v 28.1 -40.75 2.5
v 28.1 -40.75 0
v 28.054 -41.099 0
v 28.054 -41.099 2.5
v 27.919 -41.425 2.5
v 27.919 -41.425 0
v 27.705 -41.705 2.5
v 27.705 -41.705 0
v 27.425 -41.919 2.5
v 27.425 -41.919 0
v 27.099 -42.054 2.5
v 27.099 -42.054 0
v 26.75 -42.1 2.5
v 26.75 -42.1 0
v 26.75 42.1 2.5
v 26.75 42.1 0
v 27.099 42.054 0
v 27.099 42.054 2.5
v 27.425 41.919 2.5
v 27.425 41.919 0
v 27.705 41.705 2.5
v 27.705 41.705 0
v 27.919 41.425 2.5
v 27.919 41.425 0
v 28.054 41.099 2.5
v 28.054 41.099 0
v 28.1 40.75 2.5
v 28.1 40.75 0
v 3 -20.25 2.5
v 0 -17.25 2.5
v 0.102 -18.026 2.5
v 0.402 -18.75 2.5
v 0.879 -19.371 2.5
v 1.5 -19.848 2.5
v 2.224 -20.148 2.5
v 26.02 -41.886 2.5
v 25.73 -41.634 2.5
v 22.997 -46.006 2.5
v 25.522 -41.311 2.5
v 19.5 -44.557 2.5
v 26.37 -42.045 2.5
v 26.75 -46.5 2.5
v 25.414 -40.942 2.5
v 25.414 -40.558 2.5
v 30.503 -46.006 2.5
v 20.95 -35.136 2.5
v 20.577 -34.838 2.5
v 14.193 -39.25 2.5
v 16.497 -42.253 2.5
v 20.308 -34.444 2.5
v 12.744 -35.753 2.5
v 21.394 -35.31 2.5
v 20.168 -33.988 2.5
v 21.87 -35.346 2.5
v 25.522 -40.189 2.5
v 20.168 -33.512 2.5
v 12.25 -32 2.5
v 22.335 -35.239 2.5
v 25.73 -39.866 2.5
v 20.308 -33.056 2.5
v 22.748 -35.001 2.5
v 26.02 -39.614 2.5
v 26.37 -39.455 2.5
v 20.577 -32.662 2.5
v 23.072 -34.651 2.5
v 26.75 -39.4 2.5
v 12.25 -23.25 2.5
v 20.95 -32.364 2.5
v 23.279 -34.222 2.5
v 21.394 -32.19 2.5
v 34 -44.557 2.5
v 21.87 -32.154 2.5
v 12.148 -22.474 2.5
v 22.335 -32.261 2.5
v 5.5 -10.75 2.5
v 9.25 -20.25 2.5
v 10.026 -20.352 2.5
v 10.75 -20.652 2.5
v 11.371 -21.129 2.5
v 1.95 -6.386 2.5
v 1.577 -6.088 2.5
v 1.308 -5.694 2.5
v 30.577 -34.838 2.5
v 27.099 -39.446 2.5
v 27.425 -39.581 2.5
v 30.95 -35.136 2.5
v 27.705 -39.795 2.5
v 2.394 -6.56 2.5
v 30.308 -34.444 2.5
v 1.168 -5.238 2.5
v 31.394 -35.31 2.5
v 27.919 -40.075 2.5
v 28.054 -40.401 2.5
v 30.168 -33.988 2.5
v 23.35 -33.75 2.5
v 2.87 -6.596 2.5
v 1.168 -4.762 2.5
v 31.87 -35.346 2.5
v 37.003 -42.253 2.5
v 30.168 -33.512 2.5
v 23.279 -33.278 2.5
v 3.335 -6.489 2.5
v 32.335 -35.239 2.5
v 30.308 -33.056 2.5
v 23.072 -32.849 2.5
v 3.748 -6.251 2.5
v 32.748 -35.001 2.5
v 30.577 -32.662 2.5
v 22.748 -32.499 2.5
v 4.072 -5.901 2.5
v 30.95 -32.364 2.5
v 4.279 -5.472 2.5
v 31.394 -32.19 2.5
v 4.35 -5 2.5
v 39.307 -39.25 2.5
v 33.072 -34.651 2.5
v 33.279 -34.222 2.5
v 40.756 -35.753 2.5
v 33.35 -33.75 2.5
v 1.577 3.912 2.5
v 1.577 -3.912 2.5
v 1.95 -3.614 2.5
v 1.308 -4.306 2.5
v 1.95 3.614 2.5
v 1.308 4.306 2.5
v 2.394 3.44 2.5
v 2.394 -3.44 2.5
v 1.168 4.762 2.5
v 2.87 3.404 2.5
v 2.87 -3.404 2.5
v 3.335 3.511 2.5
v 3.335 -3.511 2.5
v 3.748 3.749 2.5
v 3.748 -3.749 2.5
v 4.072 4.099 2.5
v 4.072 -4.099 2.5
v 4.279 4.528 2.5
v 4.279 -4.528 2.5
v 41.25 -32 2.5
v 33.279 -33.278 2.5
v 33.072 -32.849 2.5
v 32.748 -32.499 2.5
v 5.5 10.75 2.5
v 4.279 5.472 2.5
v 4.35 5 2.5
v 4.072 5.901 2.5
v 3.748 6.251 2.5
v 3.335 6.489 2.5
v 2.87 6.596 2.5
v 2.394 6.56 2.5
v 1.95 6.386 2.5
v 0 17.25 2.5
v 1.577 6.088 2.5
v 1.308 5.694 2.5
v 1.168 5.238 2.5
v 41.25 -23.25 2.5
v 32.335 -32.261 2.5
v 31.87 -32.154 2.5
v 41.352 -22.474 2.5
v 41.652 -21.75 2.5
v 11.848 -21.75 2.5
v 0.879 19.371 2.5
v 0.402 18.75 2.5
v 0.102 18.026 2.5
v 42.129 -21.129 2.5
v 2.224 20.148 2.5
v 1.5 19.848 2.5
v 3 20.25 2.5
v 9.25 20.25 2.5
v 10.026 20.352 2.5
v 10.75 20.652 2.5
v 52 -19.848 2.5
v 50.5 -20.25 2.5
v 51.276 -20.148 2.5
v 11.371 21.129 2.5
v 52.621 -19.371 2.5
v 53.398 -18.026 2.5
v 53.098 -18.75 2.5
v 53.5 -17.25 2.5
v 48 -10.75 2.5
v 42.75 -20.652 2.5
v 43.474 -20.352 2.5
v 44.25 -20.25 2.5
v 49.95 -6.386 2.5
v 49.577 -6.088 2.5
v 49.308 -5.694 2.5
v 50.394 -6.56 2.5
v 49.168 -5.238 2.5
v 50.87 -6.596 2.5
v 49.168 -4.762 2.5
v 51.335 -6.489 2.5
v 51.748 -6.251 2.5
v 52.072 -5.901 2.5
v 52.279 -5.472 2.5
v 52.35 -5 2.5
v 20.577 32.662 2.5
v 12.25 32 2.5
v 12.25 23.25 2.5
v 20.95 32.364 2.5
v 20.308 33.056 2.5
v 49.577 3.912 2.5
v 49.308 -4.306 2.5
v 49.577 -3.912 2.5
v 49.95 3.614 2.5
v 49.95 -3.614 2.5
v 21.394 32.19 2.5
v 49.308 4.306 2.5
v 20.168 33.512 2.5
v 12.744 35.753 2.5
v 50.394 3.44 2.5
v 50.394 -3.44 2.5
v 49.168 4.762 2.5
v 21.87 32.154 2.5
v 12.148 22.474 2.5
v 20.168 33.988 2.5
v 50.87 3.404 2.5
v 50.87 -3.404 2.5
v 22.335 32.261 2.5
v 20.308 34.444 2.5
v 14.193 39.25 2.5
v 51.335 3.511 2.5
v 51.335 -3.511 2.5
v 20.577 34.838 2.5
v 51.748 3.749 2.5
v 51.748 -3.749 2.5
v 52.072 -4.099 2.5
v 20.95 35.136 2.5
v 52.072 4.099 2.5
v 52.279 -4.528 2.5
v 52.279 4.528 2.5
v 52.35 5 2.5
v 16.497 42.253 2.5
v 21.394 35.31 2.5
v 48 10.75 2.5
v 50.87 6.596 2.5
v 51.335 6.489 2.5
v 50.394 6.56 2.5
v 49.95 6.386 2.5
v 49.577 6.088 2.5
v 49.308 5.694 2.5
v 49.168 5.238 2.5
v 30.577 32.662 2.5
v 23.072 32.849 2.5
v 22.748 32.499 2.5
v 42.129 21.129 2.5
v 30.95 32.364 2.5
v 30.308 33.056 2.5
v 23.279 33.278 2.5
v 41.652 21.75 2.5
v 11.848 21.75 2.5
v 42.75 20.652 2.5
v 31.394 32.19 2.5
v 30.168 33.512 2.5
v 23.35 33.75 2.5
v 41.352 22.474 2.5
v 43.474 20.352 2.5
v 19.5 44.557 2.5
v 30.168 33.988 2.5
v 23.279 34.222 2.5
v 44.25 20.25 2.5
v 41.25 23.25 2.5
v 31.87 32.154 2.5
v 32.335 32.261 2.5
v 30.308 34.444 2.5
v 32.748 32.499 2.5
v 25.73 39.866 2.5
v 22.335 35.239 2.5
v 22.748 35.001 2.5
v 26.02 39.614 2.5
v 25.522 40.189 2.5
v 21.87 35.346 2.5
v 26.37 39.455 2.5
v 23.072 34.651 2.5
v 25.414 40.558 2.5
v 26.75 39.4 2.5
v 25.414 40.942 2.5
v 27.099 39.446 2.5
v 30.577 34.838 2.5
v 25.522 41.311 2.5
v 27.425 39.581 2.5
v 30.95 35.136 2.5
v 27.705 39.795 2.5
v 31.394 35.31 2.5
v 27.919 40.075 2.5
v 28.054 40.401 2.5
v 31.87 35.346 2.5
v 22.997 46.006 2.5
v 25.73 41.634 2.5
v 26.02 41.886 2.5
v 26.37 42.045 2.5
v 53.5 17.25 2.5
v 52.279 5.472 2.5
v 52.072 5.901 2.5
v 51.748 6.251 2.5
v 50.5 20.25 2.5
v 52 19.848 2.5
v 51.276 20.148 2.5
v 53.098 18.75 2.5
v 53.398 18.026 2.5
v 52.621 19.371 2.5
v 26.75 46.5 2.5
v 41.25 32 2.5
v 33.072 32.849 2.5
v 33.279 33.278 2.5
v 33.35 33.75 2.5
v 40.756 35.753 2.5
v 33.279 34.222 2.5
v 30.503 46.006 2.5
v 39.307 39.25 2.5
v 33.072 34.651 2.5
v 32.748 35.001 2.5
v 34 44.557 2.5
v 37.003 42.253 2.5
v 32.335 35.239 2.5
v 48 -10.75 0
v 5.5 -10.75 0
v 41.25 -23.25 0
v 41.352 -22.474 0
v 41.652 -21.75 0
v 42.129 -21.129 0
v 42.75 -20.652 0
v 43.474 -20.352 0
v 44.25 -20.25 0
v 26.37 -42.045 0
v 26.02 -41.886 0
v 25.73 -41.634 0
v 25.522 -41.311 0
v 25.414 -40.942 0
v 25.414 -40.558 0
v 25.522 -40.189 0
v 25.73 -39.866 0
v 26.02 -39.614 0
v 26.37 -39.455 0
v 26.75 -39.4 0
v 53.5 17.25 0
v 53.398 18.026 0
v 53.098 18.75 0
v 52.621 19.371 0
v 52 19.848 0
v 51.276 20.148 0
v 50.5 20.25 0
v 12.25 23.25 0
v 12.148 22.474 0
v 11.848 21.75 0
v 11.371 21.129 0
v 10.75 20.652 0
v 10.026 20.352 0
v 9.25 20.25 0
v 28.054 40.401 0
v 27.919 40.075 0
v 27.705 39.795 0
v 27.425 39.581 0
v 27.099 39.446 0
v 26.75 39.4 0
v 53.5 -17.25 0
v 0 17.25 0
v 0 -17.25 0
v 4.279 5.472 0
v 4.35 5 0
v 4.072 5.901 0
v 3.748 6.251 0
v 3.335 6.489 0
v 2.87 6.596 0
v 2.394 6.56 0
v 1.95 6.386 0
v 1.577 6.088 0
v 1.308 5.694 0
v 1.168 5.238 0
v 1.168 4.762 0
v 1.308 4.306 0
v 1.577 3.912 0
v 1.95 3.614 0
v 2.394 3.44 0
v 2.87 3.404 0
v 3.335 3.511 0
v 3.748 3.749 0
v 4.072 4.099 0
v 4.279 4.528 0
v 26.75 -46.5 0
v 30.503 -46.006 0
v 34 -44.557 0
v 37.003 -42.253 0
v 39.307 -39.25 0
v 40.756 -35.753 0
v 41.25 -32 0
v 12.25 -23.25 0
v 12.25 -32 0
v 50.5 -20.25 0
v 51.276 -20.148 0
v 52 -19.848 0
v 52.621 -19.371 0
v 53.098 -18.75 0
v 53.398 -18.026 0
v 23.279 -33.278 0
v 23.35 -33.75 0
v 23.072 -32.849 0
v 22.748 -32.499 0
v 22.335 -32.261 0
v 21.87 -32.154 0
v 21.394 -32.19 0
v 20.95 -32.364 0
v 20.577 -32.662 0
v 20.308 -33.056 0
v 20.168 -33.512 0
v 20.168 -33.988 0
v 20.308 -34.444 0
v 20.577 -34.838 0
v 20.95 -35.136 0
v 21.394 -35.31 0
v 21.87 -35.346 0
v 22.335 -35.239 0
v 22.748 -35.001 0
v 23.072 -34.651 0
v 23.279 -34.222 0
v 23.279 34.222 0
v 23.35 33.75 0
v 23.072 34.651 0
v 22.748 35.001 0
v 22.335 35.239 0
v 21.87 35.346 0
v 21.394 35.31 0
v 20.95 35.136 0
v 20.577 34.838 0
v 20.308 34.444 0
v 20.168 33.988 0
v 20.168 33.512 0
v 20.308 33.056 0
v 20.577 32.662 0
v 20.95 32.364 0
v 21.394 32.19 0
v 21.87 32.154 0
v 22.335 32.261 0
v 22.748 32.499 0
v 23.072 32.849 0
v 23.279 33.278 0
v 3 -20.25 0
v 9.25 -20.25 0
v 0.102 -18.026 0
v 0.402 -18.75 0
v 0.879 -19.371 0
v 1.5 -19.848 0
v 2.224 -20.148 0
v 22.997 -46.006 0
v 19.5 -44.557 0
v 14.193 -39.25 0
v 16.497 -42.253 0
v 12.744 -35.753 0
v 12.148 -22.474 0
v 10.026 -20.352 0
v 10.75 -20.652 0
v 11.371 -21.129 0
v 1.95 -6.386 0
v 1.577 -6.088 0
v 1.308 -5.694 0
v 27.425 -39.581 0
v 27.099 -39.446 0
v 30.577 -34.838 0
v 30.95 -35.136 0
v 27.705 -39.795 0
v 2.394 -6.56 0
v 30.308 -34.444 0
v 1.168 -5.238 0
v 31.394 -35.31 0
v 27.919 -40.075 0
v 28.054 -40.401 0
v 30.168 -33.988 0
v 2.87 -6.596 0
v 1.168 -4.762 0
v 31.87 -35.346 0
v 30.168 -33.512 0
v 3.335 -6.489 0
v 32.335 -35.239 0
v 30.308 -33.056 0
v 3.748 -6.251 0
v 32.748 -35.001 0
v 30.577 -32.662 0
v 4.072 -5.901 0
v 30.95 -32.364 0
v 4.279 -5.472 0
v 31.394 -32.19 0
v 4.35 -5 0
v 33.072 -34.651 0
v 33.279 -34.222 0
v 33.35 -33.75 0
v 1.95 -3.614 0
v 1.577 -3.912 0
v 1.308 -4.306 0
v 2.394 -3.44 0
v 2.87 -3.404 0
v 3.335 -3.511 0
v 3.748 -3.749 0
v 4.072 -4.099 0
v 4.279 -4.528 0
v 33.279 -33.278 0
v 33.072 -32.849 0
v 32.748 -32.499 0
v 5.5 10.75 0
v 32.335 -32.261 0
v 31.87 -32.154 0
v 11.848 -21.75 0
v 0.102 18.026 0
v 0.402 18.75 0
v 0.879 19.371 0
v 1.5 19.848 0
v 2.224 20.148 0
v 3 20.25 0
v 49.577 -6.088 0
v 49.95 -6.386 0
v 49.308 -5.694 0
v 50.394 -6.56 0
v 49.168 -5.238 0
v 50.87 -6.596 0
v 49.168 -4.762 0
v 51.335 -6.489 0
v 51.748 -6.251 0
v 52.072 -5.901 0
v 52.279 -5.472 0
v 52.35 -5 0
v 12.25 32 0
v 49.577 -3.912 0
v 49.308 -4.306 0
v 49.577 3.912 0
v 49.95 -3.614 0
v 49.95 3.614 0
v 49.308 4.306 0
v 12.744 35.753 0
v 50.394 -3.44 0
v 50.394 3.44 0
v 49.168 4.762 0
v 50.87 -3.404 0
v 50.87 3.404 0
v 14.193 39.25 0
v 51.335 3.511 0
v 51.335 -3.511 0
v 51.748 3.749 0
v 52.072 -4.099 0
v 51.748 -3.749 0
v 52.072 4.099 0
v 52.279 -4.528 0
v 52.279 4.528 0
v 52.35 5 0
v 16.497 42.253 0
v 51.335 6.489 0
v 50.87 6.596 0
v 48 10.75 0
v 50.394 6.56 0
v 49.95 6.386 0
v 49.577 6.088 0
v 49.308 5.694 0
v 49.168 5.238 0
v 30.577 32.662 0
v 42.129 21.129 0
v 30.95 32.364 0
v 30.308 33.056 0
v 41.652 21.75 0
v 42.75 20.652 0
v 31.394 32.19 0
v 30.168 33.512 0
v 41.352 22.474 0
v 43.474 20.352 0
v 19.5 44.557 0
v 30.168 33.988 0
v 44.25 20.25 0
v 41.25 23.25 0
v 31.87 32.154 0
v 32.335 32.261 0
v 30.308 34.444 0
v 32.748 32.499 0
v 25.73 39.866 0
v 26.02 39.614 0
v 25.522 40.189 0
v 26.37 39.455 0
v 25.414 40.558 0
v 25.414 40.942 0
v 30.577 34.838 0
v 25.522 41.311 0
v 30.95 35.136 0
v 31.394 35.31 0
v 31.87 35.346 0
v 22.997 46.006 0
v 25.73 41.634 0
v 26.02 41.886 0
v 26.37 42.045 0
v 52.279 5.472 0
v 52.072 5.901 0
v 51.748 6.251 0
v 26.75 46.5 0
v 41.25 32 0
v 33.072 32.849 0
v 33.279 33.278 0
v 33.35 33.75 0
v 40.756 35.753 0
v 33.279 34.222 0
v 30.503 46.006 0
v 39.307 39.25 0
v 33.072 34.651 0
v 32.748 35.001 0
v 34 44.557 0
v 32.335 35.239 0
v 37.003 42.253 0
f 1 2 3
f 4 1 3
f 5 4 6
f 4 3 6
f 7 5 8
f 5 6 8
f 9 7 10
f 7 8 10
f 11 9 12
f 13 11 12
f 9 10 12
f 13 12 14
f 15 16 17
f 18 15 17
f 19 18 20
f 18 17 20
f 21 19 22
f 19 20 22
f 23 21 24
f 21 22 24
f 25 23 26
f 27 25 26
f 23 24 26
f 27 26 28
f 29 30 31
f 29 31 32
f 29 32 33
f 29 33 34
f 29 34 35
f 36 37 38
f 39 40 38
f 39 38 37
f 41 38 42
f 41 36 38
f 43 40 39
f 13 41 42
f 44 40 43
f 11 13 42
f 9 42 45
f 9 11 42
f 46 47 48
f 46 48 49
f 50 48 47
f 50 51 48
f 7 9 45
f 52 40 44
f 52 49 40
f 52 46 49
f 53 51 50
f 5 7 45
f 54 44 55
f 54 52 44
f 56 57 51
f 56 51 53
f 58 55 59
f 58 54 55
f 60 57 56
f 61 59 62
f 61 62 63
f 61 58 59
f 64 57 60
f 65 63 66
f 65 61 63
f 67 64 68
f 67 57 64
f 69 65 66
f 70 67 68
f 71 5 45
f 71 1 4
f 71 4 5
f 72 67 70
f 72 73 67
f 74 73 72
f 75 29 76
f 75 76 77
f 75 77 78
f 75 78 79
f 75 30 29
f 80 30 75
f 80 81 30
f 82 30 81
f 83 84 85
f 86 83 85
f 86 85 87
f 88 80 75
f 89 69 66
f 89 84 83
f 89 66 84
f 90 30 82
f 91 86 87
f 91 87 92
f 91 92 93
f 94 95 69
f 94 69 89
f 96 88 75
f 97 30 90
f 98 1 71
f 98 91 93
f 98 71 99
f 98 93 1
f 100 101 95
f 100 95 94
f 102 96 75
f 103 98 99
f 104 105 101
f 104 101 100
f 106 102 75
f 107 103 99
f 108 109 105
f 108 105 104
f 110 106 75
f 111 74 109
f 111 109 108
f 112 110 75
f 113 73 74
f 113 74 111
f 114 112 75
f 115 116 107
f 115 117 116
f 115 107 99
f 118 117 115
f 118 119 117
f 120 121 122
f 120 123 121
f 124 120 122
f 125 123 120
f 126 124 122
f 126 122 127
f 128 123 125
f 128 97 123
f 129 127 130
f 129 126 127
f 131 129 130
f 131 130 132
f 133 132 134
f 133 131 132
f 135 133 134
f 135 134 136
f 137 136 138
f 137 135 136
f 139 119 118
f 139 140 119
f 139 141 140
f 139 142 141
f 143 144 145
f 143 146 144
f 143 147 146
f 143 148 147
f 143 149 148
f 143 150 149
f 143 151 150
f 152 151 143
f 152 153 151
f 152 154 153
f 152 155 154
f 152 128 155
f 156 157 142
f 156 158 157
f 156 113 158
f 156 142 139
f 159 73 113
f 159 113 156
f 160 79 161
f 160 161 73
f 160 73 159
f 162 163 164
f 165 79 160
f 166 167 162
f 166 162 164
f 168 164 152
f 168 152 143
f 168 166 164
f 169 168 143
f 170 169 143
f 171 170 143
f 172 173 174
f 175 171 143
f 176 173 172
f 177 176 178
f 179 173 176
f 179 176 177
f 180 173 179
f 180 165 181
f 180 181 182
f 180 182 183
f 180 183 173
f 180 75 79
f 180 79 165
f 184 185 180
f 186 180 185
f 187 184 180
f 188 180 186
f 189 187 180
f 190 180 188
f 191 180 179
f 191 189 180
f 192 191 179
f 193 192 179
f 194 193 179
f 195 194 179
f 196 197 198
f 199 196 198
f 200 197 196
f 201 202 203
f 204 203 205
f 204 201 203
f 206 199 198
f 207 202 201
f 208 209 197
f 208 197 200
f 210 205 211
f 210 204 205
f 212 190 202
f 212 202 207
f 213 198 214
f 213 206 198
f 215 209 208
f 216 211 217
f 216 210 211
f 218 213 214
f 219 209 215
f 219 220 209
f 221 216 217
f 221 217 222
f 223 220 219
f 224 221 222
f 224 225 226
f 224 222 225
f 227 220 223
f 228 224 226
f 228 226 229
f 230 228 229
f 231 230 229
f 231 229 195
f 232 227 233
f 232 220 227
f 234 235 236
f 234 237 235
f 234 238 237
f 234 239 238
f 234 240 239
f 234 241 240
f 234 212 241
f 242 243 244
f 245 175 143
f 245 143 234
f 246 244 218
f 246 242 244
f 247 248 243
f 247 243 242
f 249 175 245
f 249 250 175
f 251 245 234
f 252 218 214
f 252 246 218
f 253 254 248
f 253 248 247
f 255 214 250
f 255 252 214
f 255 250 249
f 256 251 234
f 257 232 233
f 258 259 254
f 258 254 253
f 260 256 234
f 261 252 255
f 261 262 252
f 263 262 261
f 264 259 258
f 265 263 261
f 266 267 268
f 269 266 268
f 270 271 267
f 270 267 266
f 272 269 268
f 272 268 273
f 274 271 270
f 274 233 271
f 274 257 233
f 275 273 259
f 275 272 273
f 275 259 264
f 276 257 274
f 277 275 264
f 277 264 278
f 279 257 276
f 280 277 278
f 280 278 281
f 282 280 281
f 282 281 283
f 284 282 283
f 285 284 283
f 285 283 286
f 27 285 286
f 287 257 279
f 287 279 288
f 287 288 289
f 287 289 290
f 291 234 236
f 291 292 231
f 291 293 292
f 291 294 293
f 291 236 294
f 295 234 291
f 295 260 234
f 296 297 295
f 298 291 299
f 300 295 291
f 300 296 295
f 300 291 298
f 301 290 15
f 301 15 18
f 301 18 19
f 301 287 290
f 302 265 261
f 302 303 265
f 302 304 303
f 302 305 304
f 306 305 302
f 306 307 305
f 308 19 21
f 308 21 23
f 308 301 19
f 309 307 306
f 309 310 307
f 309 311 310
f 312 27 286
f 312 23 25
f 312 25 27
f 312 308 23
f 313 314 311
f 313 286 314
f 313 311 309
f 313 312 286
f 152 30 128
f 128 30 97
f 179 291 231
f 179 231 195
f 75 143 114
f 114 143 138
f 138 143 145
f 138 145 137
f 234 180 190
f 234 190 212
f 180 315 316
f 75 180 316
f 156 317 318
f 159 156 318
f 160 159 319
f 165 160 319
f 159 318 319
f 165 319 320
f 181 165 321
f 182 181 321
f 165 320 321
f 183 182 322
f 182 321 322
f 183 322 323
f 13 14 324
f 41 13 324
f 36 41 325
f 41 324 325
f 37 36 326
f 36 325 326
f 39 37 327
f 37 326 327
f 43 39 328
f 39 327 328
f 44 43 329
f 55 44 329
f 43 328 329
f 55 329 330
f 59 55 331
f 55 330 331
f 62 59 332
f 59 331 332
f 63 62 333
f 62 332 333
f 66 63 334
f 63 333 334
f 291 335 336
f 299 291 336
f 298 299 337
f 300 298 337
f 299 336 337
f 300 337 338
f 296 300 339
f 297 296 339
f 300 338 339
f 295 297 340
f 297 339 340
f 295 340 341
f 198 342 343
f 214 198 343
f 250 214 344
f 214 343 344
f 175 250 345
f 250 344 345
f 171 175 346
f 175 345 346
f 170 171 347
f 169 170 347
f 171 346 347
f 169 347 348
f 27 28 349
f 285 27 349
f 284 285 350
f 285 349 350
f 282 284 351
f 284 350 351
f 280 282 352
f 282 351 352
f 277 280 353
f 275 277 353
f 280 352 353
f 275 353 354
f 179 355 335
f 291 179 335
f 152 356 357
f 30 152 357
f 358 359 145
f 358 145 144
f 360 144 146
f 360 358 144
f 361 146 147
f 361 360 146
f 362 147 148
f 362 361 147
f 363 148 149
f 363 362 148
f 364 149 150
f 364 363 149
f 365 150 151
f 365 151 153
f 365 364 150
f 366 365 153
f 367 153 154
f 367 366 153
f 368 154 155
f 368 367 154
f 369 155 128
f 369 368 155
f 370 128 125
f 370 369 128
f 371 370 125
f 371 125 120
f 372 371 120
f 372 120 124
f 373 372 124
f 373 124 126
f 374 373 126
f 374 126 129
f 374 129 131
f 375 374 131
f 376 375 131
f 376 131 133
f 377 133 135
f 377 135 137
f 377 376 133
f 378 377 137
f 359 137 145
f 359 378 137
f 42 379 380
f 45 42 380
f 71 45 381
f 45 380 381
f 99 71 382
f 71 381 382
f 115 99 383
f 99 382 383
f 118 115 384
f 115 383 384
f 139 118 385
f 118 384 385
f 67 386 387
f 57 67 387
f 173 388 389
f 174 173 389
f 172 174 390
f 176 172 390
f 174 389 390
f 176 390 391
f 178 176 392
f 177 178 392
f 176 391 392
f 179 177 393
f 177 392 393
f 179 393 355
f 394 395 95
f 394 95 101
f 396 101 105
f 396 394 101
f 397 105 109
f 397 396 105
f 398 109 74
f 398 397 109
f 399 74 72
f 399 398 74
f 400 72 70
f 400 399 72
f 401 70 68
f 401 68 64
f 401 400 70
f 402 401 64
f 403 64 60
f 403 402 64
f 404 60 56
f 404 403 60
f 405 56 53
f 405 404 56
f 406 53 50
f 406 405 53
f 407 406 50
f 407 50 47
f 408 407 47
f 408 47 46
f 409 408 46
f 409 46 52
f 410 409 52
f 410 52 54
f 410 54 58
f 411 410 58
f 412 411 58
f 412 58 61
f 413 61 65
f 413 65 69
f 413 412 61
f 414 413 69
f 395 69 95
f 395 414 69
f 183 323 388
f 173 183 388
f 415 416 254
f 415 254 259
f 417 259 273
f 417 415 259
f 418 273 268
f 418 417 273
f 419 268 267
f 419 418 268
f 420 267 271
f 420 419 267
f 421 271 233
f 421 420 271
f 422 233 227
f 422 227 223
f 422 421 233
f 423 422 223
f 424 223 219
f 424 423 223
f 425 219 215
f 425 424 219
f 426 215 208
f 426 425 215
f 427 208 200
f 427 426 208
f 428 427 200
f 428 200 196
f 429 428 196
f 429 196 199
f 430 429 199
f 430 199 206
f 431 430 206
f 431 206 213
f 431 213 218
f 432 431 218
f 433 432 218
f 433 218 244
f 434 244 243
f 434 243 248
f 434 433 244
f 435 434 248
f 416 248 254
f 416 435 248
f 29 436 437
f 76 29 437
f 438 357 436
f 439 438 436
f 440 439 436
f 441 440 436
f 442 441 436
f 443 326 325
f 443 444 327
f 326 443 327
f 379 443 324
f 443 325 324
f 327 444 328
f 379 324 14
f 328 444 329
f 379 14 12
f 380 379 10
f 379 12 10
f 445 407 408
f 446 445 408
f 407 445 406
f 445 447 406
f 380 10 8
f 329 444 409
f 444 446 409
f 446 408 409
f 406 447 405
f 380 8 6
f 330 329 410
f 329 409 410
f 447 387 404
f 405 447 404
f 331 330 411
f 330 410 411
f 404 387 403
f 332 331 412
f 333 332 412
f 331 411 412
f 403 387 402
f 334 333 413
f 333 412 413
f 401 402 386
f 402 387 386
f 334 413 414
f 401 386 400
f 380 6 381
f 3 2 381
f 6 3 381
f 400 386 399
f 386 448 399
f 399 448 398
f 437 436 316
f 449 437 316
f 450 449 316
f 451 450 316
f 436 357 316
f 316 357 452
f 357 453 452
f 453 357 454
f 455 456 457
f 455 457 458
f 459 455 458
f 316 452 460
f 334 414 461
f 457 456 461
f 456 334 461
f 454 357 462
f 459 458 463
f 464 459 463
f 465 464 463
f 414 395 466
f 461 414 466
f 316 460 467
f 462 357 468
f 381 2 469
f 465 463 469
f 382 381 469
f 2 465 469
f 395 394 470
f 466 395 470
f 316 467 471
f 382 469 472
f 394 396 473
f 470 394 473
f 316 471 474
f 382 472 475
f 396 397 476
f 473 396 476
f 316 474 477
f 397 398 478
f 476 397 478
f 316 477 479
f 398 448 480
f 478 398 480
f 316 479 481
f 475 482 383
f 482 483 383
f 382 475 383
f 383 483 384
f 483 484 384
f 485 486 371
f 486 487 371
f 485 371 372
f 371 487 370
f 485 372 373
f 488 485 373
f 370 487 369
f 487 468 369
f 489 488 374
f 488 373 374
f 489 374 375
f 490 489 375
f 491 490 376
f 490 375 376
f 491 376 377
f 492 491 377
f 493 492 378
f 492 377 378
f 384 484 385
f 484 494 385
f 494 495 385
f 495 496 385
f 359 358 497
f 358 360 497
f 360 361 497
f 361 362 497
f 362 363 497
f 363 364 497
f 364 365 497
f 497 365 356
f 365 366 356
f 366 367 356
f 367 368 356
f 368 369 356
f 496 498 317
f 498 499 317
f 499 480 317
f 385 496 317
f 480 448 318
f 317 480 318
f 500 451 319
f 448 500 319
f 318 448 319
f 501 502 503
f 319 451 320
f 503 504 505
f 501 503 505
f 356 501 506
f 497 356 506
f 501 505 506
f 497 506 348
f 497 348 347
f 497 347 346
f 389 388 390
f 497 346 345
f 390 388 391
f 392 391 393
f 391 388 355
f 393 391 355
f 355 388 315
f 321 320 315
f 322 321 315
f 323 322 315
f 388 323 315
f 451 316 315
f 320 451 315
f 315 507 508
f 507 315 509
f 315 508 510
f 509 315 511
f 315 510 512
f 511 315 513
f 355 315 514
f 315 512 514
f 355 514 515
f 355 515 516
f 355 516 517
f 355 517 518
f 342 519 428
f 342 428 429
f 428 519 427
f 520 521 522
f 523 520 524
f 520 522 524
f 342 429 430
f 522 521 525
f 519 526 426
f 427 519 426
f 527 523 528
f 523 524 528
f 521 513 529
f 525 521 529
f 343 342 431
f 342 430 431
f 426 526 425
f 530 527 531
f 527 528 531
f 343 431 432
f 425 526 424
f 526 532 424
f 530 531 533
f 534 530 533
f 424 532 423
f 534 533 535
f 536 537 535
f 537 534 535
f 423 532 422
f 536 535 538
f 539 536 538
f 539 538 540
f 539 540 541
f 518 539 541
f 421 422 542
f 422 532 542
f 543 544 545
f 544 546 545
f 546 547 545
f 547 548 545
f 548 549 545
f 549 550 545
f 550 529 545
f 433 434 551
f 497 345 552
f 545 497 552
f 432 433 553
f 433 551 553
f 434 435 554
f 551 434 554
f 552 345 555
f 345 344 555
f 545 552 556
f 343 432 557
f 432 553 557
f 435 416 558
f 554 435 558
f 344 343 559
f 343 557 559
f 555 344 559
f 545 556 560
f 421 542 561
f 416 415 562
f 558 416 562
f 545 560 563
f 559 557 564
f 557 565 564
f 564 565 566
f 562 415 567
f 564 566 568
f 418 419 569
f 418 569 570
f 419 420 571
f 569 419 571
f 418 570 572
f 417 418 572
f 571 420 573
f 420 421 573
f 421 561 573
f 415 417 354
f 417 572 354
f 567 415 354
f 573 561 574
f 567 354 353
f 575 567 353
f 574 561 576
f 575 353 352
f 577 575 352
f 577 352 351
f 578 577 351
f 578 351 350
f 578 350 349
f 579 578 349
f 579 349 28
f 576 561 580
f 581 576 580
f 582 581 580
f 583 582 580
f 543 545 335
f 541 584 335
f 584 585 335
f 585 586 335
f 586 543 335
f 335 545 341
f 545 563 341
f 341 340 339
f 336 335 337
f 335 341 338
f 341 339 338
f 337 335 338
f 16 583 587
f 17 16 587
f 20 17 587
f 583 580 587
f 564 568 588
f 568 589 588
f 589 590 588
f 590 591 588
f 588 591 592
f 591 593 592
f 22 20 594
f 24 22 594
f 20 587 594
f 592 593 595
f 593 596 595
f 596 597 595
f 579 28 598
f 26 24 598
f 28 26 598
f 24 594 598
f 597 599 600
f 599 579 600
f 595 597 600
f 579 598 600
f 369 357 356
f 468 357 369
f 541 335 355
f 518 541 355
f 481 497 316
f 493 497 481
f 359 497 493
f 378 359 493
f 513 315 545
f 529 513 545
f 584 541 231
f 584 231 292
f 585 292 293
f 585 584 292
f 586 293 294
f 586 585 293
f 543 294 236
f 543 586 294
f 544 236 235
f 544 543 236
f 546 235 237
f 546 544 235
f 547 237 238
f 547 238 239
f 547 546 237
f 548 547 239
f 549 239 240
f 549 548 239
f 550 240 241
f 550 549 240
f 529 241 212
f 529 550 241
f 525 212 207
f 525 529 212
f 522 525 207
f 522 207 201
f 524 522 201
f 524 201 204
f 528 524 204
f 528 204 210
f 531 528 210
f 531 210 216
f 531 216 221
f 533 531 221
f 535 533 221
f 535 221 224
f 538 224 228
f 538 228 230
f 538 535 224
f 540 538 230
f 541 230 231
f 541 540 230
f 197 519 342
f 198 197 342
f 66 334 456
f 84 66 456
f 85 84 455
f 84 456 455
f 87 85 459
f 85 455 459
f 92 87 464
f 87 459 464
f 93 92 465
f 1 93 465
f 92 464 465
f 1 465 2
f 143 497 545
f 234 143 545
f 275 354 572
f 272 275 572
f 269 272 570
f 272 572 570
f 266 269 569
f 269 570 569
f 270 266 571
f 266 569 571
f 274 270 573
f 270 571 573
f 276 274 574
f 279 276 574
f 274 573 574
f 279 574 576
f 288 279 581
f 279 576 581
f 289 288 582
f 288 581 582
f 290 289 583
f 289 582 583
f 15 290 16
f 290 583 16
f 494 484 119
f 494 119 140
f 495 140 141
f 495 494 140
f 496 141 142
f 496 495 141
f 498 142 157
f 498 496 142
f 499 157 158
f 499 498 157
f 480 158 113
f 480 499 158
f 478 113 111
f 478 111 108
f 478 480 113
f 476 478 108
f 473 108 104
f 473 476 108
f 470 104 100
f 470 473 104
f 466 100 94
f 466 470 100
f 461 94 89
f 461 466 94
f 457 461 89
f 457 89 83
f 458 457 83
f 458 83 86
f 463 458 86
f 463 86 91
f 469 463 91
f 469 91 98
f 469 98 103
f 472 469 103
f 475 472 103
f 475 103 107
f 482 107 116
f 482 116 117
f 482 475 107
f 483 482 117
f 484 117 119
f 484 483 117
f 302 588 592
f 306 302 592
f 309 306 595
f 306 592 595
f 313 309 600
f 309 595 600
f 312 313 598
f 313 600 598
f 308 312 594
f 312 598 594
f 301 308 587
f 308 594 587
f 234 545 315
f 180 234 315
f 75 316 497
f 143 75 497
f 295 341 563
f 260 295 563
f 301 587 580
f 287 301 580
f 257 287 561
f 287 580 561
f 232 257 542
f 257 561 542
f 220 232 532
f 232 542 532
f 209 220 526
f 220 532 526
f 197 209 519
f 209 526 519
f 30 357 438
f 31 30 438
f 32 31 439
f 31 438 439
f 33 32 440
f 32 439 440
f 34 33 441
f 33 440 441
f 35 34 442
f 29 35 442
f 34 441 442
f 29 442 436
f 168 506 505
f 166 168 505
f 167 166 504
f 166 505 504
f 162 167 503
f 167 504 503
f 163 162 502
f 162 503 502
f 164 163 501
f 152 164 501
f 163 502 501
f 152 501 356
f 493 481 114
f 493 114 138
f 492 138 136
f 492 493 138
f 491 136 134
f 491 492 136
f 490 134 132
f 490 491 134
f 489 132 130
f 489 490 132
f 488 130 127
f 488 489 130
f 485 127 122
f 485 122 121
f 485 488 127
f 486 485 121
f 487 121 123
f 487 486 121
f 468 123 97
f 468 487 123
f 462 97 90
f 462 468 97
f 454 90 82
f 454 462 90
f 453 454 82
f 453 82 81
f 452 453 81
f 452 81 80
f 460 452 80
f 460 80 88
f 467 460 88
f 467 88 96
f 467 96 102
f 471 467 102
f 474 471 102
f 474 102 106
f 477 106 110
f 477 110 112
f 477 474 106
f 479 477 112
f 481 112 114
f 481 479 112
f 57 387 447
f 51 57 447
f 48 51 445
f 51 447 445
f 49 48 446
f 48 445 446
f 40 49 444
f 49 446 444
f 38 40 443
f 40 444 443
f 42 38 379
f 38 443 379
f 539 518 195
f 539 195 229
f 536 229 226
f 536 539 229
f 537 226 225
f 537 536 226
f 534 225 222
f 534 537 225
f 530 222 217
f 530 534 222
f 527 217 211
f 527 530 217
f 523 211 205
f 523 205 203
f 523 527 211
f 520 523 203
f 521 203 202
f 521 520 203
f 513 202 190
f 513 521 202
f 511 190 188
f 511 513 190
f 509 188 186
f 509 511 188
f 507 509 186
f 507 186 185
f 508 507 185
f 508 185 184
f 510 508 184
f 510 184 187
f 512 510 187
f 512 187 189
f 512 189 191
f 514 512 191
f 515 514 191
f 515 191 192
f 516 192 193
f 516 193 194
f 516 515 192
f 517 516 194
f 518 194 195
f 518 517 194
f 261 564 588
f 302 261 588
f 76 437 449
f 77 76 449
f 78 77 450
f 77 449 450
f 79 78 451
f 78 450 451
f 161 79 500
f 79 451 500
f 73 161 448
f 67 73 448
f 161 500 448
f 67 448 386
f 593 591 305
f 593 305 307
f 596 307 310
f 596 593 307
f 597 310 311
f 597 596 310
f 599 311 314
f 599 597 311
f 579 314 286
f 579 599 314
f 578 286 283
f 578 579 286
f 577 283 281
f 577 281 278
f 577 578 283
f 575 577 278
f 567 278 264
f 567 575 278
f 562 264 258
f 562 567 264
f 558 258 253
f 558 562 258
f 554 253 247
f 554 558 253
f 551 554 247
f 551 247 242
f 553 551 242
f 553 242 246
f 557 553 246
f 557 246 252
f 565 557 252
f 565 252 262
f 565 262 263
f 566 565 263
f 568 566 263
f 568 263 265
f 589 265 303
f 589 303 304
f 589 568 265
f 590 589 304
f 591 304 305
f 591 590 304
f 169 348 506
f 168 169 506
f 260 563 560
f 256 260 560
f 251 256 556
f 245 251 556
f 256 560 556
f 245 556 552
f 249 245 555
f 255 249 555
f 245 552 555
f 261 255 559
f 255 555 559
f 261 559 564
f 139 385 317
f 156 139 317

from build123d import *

# Parameters (mm, degrees)
F0_R     = 1.6
F1_DEPTH = 2.5


with BuildPart() as f1:
    # F0 (on Top) → F1 (new body)
    with BuildSketch(Plane.XY):
        with BuildLine():
            Line((0, 17.25), (0, 0))
            Line((0, 0), (5.5, 0))
            Line((5.5, 0), (5.5, 10.75))
            Line((5.5, 10.75), (26.75, 10.75))
            Line((26.75, 10.75), (26.75, 32))
            Line((26.75, 32), (12.25, 32))
            Line((12.25, 32), (12.25, 23.25))
            ThreePointArc((12.25, 23.25), (11.37132, 21.12868), (9.25, 20.25))
            Line((9.25, 20.25), (3, 20.25))
            ThreePointArc((3, 20.25), (0.87868, 19.37132), (0, 17.25))
        make_face()
        with Locations((2.75, 5)):
            Circle(F0_R, mode=Mode.SUBTRACT)
        with BuildLine():
            Line((5.5, 0), (0, 0))
            Line((0, 0), (0, -17.25))
            ThreePointArc((0, -17.25), (0.87868, -19.37132), (3, -20.25))
            Line((3, -20.25), (9.25, -20.25))
            ThreePointArc((9.25, -20.25), (11.37132, -21.12868), (12.25, -23.25))
            Line((12.25, -23.25), (12.25, -32))
            Line((12.25, -32), (26.75, -32))
            Line((26.75, -32), (26.75, -10.75))
            Line((26.75, -10.75), (5.5, -10.75))
            Line((5.5, -10.75), (5.5, 0))
        make_face()
        with Locations((2.75, -5)):
            Circle(F0_R, mode=Mode.SUBTRACT)
        with BuildLine():
            Line((48, 10.75), (48, 0))
            Line((48, 0), (53.5, 0))
            Line((53.5, 0), (53.5, 17.25))
            ThreePointArc((53.5, 17.25), (52.62132, 19.37132), (50.5, 20.25))
            Line((50.5, 20.25), (44.25, 20.25))
            ThreePointArc((44.25, 20.25), (42.12868, 21.12868), (41.25, 23.25))
            Line((41.25, 23.25), (41.25, 32))
            Line((41.25, 32), (26.75, 32))
            Line((26.75, 32), (26.75, 10.75))
            Line((26.75, 10.75), (48, 10.75))
        make_face()
        with Locations((50.75, 5)):
            Circle(F0_R, mode=Mode.SUBTRACT)
        with BuildLine():
            Line((53.5, 0), (48, 0))
            Line((48, 0), (48, -10.75))
            Line((48, -10.75), (26.75, -10.75))
            Line((26.75, -10.75), (26.75, -32))
            Line((26.75, -32), (41.25, -32))
            Line((41.25, -32), (41.25, -23.25))
            ThreePointArc((41.25, -23.25), (42.12868, -21.12868), (44.25, -20.25))
            Line((44.25, -20.25), (50.5, -20.25))
            ThreePointArc((50.5, -20.25), (52.62132, -19.37132), (53.5, -17.25))
            Line((53.5, -17.25), (53.5, 0))
        make_face()
        with Locations((50.75, -5)):
            Circle(F0_R, mode=Mode.SUBTRACT)
        with BuildLine():
            Line((41.25, -32), (26.75, -32))
            Line((26.75, -32), (26.75, -39.4))
            ThreePointArc((26.75, -39.4), (27.704594, -39.795406), (28.1, -40.75))
            ThreePointArc((28.1, -40.75), (27.704594, -41.704594), (26.75, -42.1))
            Line((26.75, -42.1), (26.75, -46.5))
            ThreePointArc((26.75, -46.5), (37.003048, -42.253048), (41.25, -32))
        make_face()
        with Locations((31.75, -33.75)):
            Circle(F0_R, mode=Mode.SUBTRACT)
        with BuildLine():
            Line((26.75, -39.4), (26.75, -32))
            Line((26.75, -32), (12.25, -32))
            ThreePointArc((12.25, -32), (16.496952, -42.253048), (26.75, -46.5))
            Line((26.75, -46.5), (26.75, -42.1))
            ThreePointArc((26.75, -42.1), (25.4, -40.75), (26.75, -39.4))
        make_face()
        with Locations((21.75, -33.75)):
            Circle(F0_R, mode=Mode.SUBTRACT)
        with BuildLine():
            Line((12.25, 32), (26.75, 32))
            Line((26.75, 32), (26.75, 39.4))
            ThreePointArc((26.75, 39.4), (25.4, 40.75), (26.75, 42.1))
            Line((26.75, 42.1), (26.75, 46.5))
            ThreePointArc((26.75, 46.5), (16.496952, 42.253048), (12.25, 32))
        make_face()
        with Locations((21.75, 33.75)):
            Circle(F0_R, mode=Mode.SUBTRACT)
        with BuildLine():
            Line((26.75, 39.4), (26.75, 32))
            Line((26.75, 32), (41.25, 32))
            ThreePointArc((41.25, 32), (37.003048, 42.253048), (26.75, 46.5))
            Line((26.75, 46.5), (26.75, 42.1))
            ThreePointArc((26.75, 42.1), (27.704594, 41.704594), (28.1, 40.75))
            ThreePointArc((28.1, 40.75), (27.704594, 39.795406), (26.75, 39.4))
        make_face()
        with Locations((31.75, 33.75)):
            Circle(F0_R, mode=Mode.SUBTRACT)
    extrude(amount=F1_DEPTH)


solid = f1.part
